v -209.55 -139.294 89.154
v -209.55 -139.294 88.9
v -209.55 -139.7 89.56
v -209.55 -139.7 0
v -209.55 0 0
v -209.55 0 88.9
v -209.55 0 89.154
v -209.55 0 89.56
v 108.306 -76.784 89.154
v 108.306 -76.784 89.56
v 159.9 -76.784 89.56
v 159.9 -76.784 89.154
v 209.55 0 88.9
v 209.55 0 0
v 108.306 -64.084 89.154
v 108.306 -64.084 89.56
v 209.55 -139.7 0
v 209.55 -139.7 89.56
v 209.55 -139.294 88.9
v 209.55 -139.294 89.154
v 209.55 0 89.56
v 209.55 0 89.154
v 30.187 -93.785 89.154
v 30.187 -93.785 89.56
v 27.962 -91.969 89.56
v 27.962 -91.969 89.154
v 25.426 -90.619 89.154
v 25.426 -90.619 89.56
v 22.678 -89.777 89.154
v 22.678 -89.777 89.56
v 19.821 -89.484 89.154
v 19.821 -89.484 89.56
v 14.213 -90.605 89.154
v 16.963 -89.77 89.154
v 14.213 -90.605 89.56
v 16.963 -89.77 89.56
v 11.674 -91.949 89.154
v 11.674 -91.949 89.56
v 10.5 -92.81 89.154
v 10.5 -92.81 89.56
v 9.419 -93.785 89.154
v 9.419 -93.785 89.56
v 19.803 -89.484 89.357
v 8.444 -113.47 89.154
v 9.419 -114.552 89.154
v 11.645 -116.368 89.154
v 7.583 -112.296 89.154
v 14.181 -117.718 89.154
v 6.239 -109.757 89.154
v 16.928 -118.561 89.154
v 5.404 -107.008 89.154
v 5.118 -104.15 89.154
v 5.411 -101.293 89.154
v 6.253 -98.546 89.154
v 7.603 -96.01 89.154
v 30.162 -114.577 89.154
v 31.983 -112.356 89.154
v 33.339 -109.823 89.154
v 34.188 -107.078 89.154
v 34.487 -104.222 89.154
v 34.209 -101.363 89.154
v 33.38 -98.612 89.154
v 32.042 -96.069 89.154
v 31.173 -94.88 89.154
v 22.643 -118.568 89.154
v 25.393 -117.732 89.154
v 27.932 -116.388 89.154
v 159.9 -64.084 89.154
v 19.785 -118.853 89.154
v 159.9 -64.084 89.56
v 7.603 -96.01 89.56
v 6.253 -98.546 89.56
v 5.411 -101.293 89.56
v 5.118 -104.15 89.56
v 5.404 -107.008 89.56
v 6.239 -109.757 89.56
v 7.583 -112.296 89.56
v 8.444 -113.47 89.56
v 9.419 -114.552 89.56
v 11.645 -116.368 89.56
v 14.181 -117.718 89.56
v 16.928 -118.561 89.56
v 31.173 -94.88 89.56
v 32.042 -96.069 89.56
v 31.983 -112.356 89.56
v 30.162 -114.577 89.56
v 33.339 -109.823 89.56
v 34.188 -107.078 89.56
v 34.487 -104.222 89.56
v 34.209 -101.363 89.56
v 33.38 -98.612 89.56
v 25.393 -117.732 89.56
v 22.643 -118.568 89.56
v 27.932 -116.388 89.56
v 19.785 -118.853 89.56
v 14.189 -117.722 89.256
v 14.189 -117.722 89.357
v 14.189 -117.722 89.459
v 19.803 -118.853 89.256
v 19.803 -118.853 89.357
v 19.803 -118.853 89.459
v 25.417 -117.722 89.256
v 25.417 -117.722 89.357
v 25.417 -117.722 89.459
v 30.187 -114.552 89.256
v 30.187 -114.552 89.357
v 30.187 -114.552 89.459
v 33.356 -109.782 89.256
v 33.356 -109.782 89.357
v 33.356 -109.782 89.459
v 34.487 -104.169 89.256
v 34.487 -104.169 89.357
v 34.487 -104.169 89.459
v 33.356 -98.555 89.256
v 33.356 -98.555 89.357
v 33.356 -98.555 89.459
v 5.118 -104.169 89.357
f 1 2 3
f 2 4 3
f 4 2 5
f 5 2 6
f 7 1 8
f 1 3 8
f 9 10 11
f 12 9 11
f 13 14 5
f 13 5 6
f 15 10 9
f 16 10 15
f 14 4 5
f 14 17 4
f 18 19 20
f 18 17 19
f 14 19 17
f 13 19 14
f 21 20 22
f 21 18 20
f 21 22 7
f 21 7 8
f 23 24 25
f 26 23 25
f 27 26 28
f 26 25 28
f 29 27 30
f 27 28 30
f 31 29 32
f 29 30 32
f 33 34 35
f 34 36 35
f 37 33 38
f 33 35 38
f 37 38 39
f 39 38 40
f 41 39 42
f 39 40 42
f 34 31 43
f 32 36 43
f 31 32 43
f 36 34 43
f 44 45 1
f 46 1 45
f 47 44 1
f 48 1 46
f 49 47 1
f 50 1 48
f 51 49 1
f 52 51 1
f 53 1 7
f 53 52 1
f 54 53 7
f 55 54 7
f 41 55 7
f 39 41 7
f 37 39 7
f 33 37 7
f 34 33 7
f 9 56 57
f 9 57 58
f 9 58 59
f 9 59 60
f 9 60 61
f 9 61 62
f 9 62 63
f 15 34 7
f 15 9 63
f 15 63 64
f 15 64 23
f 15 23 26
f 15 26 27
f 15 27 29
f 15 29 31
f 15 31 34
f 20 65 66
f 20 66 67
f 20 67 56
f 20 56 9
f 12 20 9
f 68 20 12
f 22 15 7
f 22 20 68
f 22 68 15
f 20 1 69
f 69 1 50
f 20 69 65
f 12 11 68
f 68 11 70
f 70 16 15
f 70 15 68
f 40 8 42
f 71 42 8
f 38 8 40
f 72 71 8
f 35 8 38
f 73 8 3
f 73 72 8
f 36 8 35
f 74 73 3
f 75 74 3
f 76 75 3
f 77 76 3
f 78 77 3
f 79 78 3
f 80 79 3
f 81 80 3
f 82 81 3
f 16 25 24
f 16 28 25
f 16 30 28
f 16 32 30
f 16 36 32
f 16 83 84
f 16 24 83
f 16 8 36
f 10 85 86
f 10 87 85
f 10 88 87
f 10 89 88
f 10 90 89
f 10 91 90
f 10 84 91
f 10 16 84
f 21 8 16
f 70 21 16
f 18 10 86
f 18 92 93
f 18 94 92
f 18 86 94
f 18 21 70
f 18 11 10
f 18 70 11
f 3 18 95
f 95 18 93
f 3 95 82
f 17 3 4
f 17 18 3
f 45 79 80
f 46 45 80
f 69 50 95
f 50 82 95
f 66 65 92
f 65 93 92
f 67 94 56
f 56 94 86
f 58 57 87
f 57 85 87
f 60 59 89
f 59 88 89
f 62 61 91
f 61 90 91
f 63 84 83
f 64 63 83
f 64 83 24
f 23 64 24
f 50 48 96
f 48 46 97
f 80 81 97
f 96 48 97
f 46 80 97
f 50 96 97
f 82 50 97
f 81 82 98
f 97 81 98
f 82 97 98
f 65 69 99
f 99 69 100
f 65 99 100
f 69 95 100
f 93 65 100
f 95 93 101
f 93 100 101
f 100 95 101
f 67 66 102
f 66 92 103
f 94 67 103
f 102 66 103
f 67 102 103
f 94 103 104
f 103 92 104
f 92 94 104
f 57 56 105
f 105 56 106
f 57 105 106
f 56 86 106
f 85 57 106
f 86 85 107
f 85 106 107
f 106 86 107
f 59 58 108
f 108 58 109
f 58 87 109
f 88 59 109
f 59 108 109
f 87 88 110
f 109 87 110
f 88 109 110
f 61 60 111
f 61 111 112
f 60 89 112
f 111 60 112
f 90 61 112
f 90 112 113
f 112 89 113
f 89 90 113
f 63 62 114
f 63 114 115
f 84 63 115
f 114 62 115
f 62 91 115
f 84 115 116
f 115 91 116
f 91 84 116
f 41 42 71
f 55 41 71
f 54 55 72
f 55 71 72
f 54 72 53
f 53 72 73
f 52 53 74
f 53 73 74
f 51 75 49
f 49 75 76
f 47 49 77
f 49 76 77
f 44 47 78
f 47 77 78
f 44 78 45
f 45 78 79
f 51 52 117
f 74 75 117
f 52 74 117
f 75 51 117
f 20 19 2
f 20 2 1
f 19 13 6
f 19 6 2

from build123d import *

# Parameters (mm, degrees)
F1_DEPTH = 209.55
F2_W     = 51.59375
F2_H     = 12.7
F3_DEPTH = 0.4064


# Not quite as in the source:
# - the dataset's text gives a spline's control points without its knots; the knots are read off the source's solid


with BuildPart() as f1:
    # F0 (on Right) → F1 (new body, symmetric)
    with BuildSketch(Plane.YZ):
        Polygon((-139.7, 0), (0, 0), (0, 88.9), (-139.2936, 88.9), (-139.2936, 89.154), (0, 89.154), (0, 89.5604), (-139.7, 89.5604), align=None)
    extrude(amount=F1_DEPTH, both=True)

    # F2 (on face) → F3 (cut, through all)
    with BuildSketch(Plane.XY.offset(89.5604)):
        with Locations((134.1027867572, -70.4335131599)):
            Rectangle(F2_W, F2_H)
        with BuildLine():
            add(Edge.make_bspline(
                [(30.1867131572, -93.7849015599), (27.4681765572, -91.0667205599), (23.6476101572, -89.4842243599), (19.8028375572, -89.4842243599)],
                knots=[7, 7, 7, 7, 8, 8, 8, 8], degree=3))
            add(Edge.make_bspline(
                [(19.8028375572, -89.4842243599), (15.9588015572, -89.4842243599), (12.1382351572, -91.0667205599), (9.4193175572, -93.7849015599)],
                knots=[0, 0, 0, 0, 1, 1, 1, 1], degree=3))
            add(Edge.make_bspline(
                [(9.4193175572, -93.7849015599), (6.7011365572, -96.5034127599), (5.1184625572, -100.3242077599), (5.1184625572, -104.1685993599), (5.1184625572, -108.0127877599), (6.7011365572, -111.8335827599), (9.4193175572, -114.5517637599)],
                knots=[1, 1, 1, 1, 2, 2, 2, 3, 3, 3, 3], degree=3))
            add(Edge.make_bspline(
                [(9.4193175572, -114.5517637599), (12.1382351572, -117.2702749599), (15.9588015572, -118.8529743599), (19.8028375572, -118.8529743599), (23.6476101572, -118.8529743599), (27.4681765572, -117.2702749599), (30.1867131572, -114.5517637599), (32.9049195572, -111.8335827599), (34.4872125572, -108.0127877599), (34.4872125572, -104.1685993599), (34.4872125572, -100.3242077599), (32.9049195572, -96.5034127599), (30.1867131572, -93.7849015599)],
                knots=[3, 3, 3, 3, 4, 4, 4, 5, 5, 5, 6, 6, 6, 7, 7, 7, 7], degree=3))
        make_face()
    extrude(amount=-F3_DEPTH, mode=Mode.SUBTRACT)


solid = f1.part
